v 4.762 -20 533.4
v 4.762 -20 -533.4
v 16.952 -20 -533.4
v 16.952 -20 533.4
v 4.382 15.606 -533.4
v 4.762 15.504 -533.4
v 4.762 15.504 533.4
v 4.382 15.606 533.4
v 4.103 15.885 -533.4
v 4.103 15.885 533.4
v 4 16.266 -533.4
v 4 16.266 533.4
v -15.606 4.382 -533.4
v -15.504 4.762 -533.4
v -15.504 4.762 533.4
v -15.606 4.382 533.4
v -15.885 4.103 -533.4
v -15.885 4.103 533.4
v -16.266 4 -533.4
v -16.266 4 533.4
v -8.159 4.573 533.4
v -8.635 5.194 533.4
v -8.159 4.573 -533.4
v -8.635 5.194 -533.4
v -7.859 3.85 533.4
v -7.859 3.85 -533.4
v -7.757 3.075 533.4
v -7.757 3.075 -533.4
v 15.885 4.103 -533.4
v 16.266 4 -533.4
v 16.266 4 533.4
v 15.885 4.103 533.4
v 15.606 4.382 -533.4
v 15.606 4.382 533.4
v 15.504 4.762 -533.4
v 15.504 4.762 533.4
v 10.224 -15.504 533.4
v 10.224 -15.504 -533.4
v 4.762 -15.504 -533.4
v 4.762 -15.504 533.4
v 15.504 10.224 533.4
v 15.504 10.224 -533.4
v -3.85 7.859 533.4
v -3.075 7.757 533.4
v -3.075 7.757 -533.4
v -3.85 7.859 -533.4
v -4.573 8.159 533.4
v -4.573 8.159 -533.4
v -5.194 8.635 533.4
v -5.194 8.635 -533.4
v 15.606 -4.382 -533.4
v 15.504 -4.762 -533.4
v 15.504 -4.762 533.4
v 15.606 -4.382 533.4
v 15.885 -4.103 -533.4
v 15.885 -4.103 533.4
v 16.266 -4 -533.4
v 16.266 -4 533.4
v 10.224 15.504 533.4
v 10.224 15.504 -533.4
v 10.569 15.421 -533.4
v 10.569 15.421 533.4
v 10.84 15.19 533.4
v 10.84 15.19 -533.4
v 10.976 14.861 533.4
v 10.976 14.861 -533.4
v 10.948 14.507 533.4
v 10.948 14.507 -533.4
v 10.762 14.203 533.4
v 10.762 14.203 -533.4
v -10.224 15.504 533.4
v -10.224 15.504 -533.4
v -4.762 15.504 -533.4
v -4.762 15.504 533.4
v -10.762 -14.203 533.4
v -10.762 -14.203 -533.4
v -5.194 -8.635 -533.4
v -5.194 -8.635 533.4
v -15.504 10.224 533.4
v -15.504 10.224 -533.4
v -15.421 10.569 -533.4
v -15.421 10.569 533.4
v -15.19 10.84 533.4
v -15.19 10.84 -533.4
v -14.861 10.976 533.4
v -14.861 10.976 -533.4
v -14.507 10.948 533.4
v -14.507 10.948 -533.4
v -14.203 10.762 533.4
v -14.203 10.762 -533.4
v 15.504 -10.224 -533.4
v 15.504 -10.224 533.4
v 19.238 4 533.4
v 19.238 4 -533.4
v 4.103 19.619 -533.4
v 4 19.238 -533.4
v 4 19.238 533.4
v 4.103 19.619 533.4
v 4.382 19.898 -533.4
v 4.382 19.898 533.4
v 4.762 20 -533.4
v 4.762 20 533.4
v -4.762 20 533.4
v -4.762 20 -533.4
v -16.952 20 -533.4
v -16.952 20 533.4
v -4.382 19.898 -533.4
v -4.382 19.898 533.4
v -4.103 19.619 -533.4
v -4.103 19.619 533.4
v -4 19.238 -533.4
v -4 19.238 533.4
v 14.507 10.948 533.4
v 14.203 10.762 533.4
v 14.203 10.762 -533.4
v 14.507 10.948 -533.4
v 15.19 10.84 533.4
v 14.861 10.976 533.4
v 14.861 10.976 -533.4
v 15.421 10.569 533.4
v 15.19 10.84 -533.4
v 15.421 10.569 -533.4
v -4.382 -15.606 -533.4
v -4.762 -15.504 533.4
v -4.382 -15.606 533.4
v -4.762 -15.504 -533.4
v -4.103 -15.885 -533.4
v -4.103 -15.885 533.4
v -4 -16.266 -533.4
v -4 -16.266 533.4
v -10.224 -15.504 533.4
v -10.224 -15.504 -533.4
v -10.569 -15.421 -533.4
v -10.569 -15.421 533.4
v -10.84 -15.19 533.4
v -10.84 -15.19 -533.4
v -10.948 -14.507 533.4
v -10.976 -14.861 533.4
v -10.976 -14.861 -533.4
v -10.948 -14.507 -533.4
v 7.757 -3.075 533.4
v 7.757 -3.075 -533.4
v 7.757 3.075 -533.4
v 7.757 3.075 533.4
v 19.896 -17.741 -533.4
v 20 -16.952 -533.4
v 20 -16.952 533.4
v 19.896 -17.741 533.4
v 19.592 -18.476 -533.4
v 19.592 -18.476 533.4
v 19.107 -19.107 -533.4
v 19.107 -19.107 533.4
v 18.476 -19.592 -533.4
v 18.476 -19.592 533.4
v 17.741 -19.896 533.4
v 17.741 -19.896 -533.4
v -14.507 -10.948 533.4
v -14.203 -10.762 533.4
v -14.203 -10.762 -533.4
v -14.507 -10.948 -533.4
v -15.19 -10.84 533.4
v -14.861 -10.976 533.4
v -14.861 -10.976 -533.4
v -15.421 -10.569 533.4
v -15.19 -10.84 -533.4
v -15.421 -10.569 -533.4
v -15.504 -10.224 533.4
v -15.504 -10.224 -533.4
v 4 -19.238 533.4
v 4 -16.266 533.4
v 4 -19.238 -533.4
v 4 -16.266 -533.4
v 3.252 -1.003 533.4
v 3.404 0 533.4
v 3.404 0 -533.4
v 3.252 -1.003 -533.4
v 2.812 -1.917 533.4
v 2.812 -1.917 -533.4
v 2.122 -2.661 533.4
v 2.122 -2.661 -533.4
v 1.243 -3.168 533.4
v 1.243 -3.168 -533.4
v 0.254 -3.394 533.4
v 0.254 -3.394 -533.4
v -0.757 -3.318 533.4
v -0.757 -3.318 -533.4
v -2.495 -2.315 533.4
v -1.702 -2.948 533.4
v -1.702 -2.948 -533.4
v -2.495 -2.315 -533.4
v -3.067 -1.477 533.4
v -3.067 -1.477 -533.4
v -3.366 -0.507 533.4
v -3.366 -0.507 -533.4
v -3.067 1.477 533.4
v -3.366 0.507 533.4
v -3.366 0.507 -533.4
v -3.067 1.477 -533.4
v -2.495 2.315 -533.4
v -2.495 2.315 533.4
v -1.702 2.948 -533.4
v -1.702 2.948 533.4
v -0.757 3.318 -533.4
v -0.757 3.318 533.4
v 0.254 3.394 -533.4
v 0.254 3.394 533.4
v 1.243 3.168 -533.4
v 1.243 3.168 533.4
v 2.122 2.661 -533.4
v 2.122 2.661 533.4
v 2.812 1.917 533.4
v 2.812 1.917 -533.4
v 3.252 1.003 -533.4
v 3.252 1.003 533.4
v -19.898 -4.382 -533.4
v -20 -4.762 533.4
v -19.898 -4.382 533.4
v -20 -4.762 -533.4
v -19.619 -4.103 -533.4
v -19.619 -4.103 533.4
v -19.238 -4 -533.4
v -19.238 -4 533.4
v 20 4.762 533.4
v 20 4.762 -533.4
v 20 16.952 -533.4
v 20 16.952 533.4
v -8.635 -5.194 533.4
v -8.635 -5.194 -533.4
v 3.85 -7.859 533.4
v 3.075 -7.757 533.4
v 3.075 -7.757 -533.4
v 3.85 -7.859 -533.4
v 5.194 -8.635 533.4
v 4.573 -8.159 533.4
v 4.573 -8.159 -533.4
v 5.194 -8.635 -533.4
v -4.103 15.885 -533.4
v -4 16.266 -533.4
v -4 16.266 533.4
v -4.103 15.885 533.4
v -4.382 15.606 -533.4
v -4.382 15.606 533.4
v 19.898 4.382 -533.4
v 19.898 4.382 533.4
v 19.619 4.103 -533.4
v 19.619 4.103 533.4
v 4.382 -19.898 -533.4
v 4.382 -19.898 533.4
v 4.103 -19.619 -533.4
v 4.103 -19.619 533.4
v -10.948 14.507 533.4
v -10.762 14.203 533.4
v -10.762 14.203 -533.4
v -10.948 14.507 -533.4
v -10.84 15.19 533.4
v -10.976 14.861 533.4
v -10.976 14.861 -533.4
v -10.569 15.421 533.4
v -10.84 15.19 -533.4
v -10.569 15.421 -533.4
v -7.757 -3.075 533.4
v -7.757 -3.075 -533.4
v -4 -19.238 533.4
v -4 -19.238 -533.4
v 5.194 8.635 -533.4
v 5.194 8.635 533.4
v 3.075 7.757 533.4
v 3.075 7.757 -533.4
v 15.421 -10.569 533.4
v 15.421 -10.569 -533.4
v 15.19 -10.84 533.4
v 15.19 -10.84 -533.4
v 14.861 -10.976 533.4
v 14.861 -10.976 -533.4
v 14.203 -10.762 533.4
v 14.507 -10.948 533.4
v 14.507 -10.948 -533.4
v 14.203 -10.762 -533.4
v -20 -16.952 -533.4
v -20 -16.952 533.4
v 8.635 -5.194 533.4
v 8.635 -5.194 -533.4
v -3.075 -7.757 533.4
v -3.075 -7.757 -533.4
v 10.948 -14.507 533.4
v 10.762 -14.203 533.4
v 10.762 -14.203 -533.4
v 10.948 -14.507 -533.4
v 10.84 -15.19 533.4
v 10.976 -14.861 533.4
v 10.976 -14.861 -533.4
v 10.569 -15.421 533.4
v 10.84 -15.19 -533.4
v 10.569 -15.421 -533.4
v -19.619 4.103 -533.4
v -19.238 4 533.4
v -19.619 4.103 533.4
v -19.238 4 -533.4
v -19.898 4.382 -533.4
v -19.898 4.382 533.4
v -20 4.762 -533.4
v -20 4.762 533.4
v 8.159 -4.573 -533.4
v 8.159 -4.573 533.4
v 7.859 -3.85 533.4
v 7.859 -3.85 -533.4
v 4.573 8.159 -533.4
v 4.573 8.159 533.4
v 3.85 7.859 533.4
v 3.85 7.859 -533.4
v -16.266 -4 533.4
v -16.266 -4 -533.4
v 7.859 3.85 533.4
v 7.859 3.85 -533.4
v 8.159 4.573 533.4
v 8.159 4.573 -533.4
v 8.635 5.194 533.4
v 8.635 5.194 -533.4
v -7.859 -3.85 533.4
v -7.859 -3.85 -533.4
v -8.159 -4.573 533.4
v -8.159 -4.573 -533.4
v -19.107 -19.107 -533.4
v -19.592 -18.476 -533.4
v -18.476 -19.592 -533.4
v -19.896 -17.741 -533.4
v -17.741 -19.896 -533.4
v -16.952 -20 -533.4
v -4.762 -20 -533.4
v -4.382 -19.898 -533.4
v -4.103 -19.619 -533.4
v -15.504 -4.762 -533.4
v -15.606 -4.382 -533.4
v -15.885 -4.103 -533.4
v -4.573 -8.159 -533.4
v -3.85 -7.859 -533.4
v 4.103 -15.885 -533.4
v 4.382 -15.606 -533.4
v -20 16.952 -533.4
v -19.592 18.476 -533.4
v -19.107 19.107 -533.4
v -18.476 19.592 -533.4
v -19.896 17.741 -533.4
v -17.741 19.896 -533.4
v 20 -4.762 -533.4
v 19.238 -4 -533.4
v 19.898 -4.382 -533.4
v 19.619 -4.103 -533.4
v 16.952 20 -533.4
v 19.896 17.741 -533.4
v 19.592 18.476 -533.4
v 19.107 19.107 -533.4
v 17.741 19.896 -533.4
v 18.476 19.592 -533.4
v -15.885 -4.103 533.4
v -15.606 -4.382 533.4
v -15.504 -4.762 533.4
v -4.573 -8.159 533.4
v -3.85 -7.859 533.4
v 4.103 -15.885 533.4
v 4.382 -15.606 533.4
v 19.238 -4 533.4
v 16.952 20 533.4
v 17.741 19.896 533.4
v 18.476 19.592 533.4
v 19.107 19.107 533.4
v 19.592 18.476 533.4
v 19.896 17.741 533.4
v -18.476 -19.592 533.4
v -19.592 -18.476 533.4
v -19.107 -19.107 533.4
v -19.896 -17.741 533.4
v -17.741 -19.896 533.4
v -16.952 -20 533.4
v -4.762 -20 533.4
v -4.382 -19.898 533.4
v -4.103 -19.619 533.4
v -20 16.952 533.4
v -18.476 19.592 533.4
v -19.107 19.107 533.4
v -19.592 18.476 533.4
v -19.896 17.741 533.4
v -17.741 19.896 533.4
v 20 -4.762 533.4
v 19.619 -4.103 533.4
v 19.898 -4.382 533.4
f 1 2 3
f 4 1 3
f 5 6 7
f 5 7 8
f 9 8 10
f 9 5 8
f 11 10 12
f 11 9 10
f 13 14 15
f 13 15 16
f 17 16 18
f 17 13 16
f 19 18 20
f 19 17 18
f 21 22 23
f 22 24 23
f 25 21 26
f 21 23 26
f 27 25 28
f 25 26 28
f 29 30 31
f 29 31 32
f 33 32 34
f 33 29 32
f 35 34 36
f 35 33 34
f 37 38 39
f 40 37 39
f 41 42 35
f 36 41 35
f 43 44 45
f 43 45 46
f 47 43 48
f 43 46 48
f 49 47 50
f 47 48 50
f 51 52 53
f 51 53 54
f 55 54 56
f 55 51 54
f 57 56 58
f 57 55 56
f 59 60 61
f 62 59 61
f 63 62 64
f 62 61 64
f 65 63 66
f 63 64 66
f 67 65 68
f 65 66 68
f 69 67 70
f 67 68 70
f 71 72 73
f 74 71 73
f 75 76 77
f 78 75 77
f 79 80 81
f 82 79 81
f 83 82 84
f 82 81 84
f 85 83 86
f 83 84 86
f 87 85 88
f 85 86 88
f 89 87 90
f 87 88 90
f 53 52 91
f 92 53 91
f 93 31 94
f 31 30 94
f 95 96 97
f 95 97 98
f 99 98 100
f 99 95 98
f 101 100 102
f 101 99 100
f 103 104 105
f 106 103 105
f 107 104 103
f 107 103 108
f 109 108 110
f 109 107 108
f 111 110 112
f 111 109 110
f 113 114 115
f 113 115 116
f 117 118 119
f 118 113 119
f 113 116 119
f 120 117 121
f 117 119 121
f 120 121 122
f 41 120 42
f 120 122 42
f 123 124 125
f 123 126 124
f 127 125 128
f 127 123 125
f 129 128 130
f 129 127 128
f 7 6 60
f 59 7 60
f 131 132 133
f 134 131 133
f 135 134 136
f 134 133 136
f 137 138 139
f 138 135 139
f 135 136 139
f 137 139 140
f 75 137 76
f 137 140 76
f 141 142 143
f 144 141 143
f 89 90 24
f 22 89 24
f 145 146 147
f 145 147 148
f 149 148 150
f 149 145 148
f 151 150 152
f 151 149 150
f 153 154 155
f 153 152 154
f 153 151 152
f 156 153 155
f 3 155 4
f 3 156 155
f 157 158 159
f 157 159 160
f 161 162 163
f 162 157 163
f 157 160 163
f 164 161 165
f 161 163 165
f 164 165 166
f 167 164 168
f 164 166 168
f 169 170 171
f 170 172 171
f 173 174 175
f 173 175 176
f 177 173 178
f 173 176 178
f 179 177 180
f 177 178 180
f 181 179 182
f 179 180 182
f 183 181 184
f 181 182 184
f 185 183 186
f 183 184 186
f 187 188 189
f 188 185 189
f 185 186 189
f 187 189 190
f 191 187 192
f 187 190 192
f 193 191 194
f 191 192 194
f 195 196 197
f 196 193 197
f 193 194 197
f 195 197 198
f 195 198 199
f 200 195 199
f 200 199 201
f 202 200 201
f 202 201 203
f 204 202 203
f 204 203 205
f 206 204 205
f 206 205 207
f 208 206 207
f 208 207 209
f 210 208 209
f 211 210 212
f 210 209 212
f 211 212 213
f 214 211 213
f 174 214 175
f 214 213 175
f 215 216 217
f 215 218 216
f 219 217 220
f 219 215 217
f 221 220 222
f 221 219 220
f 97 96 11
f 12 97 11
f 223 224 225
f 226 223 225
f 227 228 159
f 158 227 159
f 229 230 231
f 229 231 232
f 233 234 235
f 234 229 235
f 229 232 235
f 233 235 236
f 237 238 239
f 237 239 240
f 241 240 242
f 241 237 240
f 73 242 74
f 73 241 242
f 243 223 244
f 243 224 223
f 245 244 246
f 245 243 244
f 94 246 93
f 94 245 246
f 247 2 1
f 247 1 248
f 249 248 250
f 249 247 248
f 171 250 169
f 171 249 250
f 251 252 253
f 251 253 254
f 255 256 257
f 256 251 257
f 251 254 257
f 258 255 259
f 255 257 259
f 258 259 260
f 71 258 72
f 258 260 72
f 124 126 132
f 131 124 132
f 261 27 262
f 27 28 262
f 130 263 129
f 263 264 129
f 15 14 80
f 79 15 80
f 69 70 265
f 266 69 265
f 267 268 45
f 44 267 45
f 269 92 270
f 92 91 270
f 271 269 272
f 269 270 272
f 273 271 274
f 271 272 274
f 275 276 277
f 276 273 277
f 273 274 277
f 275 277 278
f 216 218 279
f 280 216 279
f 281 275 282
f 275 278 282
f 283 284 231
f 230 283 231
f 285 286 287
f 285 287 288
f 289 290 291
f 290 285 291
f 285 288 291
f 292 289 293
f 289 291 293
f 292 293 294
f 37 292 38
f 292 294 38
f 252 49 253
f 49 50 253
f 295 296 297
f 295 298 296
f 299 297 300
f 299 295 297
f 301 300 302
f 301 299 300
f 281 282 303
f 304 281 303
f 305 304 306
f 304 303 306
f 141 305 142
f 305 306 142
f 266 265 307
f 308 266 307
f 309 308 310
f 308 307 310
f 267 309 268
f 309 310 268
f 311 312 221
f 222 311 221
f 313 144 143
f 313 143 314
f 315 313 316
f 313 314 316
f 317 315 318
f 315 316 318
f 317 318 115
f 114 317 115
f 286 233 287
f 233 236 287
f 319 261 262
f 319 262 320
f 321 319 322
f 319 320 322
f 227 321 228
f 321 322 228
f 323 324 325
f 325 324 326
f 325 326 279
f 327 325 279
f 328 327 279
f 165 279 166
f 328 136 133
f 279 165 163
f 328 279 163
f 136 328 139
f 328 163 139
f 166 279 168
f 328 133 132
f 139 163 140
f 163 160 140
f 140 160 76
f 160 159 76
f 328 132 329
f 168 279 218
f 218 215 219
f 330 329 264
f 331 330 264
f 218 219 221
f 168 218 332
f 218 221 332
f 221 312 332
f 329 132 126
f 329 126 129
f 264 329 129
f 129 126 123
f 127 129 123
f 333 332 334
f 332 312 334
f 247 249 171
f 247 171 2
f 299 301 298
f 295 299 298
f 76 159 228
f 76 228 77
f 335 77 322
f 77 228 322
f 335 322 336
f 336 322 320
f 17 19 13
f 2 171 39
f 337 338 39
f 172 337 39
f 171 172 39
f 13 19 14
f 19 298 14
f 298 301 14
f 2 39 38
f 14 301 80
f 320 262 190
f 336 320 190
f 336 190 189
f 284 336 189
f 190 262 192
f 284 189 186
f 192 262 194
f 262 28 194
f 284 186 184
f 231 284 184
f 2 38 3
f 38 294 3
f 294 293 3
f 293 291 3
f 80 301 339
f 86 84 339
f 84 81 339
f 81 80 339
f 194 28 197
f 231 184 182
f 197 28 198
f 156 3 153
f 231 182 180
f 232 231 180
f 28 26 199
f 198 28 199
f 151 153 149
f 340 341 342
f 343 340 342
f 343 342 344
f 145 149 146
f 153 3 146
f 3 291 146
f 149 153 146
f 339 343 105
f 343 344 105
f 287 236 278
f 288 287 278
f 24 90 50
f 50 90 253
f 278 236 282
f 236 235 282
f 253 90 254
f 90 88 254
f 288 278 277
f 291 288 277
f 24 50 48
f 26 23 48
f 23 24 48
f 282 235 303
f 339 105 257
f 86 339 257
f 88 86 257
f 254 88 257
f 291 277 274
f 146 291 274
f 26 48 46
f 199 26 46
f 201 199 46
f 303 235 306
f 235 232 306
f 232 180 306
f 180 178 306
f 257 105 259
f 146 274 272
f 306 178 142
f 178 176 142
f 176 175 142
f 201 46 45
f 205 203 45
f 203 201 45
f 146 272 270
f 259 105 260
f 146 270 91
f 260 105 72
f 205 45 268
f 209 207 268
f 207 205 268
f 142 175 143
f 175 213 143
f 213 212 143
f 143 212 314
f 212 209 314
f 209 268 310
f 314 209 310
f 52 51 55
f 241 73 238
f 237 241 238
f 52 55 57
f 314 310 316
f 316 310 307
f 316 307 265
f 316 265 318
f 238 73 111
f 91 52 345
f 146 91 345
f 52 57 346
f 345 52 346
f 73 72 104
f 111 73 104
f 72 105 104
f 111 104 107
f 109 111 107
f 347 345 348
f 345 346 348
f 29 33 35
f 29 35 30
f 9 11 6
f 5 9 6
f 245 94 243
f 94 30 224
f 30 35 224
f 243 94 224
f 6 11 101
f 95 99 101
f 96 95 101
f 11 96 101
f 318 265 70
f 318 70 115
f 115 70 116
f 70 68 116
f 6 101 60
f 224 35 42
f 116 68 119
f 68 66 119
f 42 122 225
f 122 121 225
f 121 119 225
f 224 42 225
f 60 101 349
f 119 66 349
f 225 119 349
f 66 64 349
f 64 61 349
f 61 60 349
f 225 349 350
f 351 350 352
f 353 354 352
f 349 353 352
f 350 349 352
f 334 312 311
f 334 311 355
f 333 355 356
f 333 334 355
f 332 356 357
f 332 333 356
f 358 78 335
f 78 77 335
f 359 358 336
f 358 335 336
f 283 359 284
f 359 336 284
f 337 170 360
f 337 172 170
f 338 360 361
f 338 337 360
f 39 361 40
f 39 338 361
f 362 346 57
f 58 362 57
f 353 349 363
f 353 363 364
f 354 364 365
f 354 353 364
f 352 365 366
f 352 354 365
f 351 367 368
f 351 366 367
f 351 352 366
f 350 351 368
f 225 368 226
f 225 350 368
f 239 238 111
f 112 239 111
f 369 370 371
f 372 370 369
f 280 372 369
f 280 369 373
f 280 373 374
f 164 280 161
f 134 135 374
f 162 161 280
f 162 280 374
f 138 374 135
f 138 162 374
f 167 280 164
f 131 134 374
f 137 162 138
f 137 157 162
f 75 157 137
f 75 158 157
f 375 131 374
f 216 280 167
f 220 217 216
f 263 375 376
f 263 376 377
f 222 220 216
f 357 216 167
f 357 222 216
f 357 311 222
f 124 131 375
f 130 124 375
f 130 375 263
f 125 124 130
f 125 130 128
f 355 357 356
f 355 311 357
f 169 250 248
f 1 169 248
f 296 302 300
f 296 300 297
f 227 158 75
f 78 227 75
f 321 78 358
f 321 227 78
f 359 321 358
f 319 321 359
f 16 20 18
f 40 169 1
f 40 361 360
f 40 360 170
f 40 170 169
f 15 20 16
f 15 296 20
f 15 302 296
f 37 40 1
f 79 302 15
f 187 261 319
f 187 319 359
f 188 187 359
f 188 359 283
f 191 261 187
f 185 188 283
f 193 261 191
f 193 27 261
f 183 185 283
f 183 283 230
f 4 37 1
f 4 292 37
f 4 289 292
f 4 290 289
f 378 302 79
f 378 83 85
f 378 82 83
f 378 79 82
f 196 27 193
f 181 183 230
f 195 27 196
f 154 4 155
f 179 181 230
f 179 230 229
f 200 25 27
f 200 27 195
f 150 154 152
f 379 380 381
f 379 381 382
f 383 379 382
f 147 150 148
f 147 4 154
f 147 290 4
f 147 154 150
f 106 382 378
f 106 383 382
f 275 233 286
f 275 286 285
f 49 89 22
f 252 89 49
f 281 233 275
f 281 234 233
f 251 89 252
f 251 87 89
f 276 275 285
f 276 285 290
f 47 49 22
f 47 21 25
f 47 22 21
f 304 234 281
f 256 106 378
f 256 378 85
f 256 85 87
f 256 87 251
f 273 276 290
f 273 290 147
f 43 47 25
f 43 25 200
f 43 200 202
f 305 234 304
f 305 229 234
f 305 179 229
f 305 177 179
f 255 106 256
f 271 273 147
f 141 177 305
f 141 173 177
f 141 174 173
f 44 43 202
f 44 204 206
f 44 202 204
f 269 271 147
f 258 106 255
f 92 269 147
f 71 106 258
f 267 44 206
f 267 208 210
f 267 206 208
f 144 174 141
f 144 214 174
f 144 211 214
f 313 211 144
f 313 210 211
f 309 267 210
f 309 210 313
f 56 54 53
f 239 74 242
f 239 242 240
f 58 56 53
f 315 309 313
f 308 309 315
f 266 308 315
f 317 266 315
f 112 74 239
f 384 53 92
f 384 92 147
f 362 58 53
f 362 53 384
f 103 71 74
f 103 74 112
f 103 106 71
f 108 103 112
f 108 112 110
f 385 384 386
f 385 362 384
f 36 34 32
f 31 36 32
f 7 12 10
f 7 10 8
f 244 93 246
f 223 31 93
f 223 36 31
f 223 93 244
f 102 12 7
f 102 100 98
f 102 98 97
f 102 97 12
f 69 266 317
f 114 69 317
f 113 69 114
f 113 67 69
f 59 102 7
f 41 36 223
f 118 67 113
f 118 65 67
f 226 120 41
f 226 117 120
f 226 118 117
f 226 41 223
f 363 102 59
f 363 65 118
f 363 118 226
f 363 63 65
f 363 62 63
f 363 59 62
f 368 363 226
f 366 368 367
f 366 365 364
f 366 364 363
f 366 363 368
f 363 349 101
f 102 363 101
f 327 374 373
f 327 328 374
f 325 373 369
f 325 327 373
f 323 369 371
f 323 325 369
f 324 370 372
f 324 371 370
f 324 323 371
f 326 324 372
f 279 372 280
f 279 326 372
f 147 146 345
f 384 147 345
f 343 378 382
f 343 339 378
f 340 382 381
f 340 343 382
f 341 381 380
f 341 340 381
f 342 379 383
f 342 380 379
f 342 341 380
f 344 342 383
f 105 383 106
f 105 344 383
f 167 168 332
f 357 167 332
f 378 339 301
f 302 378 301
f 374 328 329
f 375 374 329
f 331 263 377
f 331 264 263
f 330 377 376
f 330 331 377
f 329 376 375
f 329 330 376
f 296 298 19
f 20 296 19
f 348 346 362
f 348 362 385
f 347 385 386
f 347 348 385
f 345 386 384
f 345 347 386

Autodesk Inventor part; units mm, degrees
ref_plane "YZ Plane" through (0, 0, 0) normal (1, 0, 0) x (0, 1, 0)
ref_plane "XZ Plane" through (0, 0, 0) normal (0, 1, 0) x (-1, 0, 0)
ref_plane "XY Plane" through (0, 0, 0) normal (0, 0, 1) x (1, 0, 0)
sketch "Sketch1" plane through (-16.952, 20, 0) normal (0, 0, 1) x (1, 0, 0)
  arc A0 (11.758, -11.3649) -> (13.8774, -12.2428) centre (13.8774, -9.2456) ccw projected
  line L0 (11.758, -11.3649) -> (6.1897, -5.7966) projected
  arc A1 (6.7285, -4.4958) -> (6.1897, -5.7966) centre (6.7285, -5.2578) ccw projected
  line L1 (6.7285, -4.4958) -> (12.1895, -4.4958) projected
  arc A2 (12.1895, -4.4958) -> (12.9515, -3.7338) centre (12.1895, -3.7338) ccw projected
  line L2 (12.9515, -3.7338) -> (12.9515, -0.762) projected
  arc A3 (12.9515, -0.762) -> (12.1895, 0) centre (12.1895, -0.762) ccw projected
  line L3 (12.1895, 0) -> (0, 0) projected
  arc A4 (0, 0) -> (-3.048, -3.048) centre (0, -3.048) ccw projected
  line L4 (-3.048, -3.048) -> (-3.048, -15.2375) projected
  arc A5 (-3.048, -15.2375) -> (-2.286, -15.9995) centre (-2.286, -15.2375) ccw projected
  line L5 (-2.286, -15.9995) -> (0.6858, -15.9995) projected
  arc A6 (0.6858, -15.9995) -> (1.4478, -15.2375) centre (0.6858, -15.2375) ccw projected
  line L6 (1.4478, -15.2375) -> (1.4478, -9.7765) projected
  arc A7 (2.7486, -9.2377) -> (1.4478, -9.7765) centre (2.2098, -9.7765) ccw projected
  line L7 (2.7486, -9.2377) -> (8.3169, -14.806) projected
  arc A8 (9.1948, -16.9254) -> (8.3169, -14.806) centre (6.1976, -16.9254) ccw projected
  line L8 (9.1948, -16.9254) -> (9.1948, -23.0746) projected
  arc A9 (8.3169, -25.194) -> (9.1948, -23.0746) centre (6.1976, -23.0746) ccw projected
  line L9 (8.3169, -25.194) -> (2.7486, -30.7623) projected
  arc A10 (1.4478, -30.2235) -> (2.7486, -30.7623) centre (2.2098, -30.2235) ccw projected
  line L10 (1.4478, -30.2235) -> (1.4478, -24.7625) projected
  arc A11 (1.4478, -24.7625) -> (0.6858, -24.0005) centre (0.6858, -24.7625) ccw projected
  line L11 (0.6858, -24.0005) -> (-2.286, -24.0005) projected
  arc A12 (-2.286, -24.0005) -> (-3.048, -24.7625) centre (-2.286, -24.7625) ccw projected
  line L12 (-3.048, -24.7625) -> (-3.048, -36.952) projected
  arc A13 (-3.048, -36.952) -> (0, -40) centre (0, -36.952) ccw projected
  line L13 (0, -40) -> (12.1895, -40) projected
  arc A14 (12.1895, -40) -> (12.9515, -39.238) centre (12.1895, -39.238) ccw projected
  line L14 (12.9515, -39.238) -> (12.9515, -36.2662) projected
  arc A15 (12.9515, -36.2662) -> (12.1895, -35.5042) centre (12.1895, -36.2662) ccw projected
  line L15 (12.1895, -35.5042) -> (6.7285, -35.5042) projected
  arc A16 (6.1897, -34.2034) -> (6.7285, -35.5042) centre (6.7285, -34.7422) ccw projected
  line L16 (6.1897, -34.2034) -> (11.758, -28.6351) projected
  arc A17 (13.8774, -27.7572) -> (11.758, -28.6351) centre (13.8774, -30.7544) ccw projected
  line L17 (13.8774, -27.7572) -> (20.0266, -27.7572) projected
  arc A18 (22.146, -28.6351) -> (20.0266, -27.7572) centre (20.0266, -30.7544) ccw projected
  line L18 (22.146, -28.6351) -> (27.7143, -34.2034) projected
  arc A19 (27.1755, -35.5042) -> (27.7143, -34.2034) centre (27.1755, -34.7422) ccw projected
  line L19 (27.1755, -35.5042) -> (21.7145, -35.5042) projected
  arc A20 (21.7145, -35.5042) -> (20.9525, -36.2662) centre (21.7145, -36.2662) ccw projected
  line L20 (20.9525, -36.2662) -> (20.9525, -39.238) projected
  arc A21 (20.9525, -39.238) -> (21.7145, -40) centre (21.7145, -39.238) ccw projected
  line L21 (21.7145, -40) -> (33.904, -40) projected
  arc A22 (33.904, -40) -> (36.952, -36.952) centre (33.904, -36.952) ccw projected
  line L22 (36.952, -36.952) -> (36.952, -24.7625) projected
  arc A23 (36.952, -24.7625) -> (36.19, -24.0005) centre (36.19, -24.7625) ccw projected
  line L23 (36.19, -24.0005) -> (33.2182, -24.0005) projected
  arc A24 (33.2182, -24.0005) -> (32.4562, -24.7625) centre (33.2182, -24.7625) ccw projected
  line L24 (32.4562, -24.7625) -> (32.4562, -30.2235) projected
  arc A25 (31.1554, -30.7623) -> (32.4562, -30.2235) centre (31.6942, -30.2235) ccw projected
  line L25 (31.1554, -30.7623) -> (25.5871, -25.194) projected
  arc A26 (24.7092, -23.0746) -> (25.5871, -25.194) centre (27.7064, -23.0746) ccw projected
  line L26 (24.7092, -23.0746) -> (24.7092, -16.9254) projected
  arc A27 (25.5871, -14.806) -> (24.7092, -16.9254) centre (27.7064, -16.9254) ccw projected
  line L27 (25.5871, -14.806) -> (31.1554, -9.2377) projected
  arc A28 (32.4562, -9.7765) -> (31.1554, -9.2377) centre (31.6942, -9.7765) ccw projected
  line L28 (32.4562, -9.7765) -> (32.4562, -15.2375) projected
  arc A29 (32.4562, -15.2375) -> (33.2182, -15.9995) centre (33.2182, -15.2375) ccw projected
  line L29 (33.2182, -15.9995) -> (36.19, -15.9995) projected
  arc A30 (36.19, -15.9995) -> (36.952, -15.2375) centre (36.19, -15.2375) ccw projected
  line L30 (36.952, -15.2375) -> (36.952, -3.048) projected
  arc A31 (36.952, -3.048) -> (33.904, 0) centre (33.904, -3.048) ccw projected
  line L31 (33.904, 0) -> (21.7145, 0) projected
  arc A32 (21.7145, 0) -> (20.9525, -0.762) centre (21.7145, -0.762) ccw projected
  line L32 (20.9525, -0.762) -> (20.9525, -3.7338) projected
  arc A33 (20.9525, -3.7338) -> (21.7145, -4.4958) centre (21.7145, -3.7338) ccw projected
  line L33 (21.7145, -4.4958) -> (27.1755, -4.4958) projected
  arc A34 (27.7143, -5.7966) -> (27.1755, -4.4958) centre (27.1755, -5.2578) ccw projected
  line L34 (27.7143, -5.7966) -> (22.146, -11.3649) projected
  arc A35 (20.0266, -12.2428) -> (22.146, -11.3649) centre (20.0266, -9.2456) ccw projected
  line L35 (20.0266, -12.2428) -> (13.8774, -12.2428) projected
  circle A36 centre (16.952, -20) radius 3.4036 projected
extrude "Extrusion1" add sketch "Sketch1" along normal mid plane 1066.8
